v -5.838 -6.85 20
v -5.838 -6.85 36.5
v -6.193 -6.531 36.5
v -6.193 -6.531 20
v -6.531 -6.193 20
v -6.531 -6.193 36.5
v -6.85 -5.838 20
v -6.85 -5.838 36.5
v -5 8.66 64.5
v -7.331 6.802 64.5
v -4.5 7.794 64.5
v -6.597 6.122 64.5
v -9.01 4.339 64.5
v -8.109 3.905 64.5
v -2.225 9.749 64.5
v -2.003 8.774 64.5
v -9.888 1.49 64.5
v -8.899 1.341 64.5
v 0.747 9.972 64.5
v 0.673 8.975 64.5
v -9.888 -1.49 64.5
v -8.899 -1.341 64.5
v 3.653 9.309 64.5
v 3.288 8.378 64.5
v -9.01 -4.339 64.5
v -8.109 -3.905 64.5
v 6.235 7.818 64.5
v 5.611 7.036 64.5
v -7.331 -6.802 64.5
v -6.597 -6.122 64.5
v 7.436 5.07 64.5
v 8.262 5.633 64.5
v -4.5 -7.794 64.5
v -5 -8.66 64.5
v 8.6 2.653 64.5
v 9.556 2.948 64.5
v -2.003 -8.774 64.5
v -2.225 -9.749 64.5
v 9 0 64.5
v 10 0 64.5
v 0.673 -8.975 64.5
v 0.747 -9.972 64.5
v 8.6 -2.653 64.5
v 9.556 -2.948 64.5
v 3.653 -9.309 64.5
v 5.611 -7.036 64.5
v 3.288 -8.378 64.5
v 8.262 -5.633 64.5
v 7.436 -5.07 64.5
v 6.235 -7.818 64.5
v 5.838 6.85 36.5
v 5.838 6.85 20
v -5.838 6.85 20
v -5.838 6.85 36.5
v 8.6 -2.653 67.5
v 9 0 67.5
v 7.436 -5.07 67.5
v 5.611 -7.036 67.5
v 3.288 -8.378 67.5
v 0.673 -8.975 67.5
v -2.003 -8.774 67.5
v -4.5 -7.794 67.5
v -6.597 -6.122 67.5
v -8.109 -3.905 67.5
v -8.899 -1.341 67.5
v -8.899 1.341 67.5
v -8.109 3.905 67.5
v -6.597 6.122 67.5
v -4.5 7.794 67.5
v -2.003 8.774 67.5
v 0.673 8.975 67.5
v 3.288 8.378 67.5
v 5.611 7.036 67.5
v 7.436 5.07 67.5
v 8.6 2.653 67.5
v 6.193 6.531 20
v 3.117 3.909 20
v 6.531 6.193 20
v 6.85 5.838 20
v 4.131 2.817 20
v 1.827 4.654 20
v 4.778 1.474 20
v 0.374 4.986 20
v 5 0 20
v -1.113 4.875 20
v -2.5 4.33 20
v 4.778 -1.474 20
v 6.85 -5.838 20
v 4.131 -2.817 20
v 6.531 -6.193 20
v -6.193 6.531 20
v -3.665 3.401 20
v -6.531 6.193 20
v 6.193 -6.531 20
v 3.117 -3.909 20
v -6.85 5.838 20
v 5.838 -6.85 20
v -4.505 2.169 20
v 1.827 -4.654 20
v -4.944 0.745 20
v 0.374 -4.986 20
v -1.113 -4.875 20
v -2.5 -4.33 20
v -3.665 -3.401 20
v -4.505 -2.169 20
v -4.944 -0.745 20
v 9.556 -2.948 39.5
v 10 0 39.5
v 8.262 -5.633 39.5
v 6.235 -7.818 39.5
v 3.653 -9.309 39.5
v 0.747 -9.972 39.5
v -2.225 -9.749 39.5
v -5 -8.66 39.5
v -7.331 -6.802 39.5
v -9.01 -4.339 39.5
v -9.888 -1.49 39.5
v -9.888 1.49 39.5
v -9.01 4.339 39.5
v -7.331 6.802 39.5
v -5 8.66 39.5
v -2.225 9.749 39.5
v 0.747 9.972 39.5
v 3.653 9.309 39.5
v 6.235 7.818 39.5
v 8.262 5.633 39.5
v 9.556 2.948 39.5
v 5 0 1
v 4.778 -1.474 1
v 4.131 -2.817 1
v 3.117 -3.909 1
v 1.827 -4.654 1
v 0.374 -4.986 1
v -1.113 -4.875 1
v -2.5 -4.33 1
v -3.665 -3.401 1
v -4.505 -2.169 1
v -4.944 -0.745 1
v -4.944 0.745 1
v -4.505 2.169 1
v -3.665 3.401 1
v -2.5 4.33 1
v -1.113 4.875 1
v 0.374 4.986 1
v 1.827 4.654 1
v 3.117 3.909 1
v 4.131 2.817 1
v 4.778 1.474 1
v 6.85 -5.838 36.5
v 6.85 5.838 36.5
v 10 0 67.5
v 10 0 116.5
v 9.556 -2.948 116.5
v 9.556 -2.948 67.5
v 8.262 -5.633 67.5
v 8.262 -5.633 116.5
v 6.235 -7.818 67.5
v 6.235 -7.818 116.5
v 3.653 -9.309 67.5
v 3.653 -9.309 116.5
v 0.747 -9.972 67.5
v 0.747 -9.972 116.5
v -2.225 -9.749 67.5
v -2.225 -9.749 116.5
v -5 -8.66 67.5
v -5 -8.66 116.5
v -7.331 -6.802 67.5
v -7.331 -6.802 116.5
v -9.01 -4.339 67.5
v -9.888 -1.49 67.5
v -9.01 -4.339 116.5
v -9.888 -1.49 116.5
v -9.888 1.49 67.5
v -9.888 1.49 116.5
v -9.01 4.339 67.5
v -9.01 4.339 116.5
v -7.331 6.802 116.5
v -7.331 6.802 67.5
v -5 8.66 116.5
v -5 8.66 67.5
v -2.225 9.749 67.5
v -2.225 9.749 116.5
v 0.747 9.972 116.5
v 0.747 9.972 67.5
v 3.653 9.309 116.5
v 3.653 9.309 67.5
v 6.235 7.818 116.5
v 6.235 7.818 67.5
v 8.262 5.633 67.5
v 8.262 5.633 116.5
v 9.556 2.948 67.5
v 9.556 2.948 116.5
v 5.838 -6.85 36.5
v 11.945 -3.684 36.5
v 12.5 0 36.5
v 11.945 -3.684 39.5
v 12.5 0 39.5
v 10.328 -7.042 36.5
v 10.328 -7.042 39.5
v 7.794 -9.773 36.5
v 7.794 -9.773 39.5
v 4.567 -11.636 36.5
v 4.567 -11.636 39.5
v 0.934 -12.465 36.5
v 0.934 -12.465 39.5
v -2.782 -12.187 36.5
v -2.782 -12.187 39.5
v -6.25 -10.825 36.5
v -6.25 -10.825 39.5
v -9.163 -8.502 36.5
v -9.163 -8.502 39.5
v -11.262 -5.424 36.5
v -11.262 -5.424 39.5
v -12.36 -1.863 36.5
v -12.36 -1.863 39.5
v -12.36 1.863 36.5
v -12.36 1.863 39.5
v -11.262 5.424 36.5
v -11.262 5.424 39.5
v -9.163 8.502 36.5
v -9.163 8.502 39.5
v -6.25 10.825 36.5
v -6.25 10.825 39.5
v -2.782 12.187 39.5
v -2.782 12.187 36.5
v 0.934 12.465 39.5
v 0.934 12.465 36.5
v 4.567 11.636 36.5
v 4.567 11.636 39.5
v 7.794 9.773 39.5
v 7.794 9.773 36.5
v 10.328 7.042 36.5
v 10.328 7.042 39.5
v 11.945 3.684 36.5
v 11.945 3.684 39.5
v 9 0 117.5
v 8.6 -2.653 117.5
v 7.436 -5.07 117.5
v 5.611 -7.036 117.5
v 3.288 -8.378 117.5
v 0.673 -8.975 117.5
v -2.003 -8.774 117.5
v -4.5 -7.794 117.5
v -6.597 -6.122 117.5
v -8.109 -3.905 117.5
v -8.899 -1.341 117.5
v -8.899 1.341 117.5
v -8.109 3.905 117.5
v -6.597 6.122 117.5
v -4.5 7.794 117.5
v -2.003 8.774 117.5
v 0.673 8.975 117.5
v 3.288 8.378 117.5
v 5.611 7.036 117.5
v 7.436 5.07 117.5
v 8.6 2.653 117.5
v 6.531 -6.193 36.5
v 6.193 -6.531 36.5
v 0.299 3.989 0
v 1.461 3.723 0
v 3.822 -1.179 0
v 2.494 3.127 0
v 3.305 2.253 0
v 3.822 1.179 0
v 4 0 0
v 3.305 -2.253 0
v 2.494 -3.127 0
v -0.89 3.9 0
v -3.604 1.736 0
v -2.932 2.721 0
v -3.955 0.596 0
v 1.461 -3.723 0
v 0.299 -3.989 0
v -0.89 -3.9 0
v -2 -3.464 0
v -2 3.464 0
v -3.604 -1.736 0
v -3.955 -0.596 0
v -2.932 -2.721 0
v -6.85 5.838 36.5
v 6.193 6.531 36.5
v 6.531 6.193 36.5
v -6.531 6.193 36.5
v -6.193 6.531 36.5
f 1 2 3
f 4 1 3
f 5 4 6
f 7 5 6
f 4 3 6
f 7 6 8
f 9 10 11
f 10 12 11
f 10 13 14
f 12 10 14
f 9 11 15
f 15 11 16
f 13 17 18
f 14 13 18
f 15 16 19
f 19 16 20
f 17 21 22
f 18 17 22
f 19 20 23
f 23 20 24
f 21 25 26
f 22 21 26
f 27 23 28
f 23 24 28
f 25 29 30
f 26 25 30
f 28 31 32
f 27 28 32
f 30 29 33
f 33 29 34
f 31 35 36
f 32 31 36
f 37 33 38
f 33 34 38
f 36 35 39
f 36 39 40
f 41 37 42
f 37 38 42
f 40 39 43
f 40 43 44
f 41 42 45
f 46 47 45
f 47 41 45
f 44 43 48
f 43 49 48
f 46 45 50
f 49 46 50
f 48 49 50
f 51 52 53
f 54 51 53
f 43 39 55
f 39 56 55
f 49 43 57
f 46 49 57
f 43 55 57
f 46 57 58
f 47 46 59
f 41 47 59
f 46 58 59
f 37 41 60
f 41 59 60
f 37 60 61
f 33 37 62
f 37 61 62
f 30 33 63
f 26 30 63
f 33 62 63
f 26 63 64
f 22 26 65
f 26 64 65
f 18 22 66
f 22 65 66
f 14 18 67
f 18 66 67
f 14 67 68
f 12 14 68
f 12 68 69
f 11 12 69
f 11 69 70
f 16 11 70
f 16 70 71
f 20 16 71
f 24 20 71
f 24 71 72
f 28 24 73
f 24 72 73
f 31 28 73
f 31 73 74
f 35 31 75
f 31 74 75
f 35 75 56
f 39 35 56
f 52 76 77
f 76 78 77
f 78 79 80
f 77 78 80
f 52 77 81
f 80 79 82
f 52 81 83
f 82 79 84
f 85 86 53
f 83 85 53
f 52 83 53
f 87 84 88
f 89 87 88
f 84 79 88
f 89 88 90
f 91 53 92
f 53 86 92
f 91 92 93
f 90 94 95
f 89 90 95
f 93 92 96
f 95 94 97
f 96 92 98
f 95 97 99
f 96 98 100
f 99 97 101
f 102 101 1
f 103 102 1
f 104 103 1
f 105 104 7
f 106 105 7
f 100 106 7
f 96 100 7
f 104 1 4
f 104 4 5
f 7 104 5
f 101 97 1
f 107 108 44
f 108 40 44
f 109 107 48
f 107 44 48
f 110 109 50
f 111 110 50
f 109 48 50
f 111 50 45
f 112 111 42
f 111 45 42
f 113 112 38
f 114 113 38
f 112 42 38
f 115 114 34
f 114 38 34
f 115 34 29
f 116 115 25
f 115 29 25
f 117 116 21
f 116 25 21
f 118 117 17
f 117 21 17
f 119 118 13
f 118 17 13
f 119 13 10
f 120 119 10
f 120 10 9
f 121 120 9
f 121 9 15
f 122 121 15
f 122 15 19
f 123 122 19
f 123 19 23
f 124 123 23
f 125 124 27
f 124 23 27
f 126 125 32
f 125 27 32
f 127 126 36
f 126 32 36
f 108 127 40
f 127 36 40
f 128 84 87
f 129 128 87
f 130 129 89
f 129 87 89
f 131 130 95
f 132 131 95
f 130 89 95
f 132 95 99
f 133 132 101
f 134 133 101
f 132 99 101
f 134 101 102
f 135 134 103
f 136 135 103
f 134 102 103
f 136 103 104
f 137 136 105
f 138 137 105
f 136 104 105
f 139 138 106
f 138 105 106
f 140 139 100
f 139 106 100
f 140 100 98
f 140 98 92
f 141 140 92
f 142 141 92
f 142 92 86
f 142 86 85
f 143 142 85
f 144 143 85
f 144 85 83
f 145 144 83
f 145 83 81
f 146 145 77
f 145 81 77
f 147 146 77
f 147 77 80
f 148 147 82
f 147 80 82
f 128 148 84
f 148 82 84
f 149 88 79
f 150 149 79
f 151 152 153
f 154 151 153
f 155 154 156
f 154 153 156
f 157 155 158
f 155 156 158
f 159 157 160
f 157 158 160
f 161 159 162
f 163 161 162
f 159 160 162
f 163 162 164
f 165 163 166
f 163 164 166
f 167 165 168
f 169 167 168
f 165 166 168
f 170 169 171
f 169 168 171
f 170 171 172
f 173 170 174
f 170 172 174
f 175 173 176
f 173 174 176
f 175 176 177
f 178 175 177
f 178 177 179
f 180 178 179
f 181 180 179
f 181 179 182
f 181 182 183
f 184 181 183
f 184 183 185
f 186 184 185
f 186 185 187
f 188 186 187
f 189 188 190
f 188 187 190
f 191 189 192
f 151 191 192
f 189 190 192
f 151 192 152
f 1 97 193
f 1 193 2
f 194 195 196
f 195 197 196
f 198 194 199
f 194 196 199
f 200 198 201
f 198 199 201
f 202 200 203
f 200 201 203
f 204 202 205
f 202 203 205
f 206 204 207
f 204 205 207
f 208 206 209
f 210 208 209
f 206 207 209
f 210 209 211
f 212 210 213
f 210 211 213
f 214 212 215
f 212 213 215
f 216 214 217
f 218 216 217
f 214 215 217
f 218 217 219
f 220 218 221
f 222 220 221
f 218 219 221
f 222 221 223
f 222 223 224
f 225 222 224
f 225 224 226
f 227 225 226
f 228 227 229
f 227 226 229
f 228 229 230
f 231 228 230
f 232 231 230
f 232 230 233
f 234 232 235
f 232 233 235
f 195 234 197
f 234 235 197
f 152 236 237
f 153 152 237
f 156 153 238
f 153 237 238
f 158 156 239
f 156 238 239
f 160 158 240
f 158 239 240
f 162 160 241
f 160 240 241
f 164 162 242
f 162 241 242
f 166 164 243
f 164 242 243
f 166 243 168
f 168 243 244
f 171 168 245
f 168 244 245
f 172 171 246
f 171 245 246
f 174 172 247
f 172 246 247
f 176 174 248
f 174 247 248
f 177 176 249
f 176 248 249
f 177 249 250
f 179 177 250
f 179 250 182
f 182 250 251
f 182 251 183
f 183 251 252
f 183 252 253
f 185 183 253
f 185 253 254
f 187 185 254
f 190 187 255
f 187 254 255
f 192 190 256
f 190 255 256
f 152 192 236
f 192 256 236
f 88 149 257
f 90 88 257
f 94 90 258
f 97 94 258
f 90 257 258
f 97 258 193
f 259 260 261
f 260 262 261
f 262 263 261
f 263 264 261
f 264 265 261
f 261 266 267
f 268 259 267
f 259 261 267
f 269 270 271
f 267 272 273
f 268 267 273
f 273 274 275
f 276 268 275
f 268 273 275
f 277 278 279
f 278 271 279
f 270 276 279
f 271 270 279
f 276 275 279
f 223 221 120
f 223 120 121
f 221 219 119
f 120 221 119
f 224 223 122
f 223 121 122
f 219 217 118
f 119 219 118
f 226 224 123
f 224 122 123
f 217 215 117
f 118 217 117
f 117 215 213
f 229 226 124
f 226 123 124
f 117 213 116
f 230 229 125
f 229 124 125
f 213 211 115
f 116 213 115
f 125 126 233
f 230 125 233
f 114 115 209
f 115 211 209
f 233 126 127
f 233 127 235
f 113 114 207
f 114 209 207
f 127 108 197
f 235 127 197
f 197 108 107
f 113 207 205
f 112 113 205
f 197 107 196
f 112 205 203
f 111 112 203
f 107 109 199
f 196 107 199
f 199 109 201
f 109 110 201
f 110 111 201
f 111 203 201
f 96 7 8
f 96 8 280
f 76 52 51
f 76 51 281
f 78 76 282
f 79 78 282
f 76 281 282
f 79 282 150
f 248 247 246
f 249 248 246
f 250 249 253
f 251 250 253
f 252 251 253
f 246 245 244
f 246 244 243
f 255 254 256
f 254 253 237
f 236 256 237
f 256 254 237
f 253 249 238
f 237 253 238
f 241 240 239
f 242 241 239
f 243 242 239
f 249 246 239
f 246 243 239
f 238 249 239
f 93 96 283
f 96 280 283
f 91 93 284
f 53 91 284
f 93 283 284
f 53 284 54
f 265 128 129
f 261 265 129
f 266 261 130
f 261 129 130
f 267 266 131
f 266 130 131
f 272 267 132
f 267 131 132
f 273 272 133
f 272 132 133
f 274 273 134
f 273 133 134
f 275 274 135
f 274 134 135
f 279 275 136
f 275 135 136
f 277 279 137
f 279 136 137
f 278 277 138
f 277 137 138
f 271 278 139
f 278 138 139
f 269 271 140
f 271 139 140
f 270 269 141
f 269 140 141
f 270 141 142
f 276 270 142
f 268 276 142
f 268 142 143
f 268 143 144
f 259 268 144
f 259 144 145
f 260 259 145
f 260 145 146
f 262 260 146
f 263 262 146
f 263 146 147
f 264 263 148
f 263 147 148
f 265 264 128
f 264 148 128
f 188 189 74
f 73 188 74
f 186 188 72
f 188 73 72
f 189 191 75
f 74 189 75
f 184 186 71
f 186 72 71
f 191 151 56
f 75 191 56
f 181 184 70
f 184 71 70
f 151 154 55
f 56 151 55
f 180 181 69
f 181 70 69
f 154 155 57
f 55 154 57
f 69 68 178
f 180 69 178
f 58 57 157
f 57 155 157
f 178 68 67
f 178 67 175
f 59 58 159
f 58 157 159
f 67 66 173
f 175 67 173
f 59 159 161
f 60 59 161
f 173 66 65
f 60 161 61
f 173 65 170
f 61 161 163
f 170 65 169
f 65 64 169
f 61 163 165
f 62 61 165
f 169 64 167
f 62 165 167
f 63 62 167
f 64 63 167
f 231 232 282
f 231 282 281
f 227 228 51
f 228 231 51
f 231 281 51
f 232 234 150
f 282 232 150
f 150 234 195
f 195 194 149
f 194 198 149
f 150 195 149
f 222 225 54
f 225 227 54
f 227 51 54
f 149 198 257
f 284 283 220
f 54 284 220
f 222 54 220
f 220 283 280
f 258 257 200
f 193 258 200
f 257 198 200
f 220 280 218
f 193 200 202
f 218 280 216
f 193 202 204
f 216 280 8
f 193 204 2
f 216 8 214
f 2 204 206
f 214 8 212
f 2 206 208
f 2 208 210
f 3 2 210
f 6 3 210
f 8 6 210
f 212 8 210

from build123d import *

# Parameters (mm, degrees)
SKETCH_2_OUTSIDE_W   = 51.54
SKETCH_2_OUTSIDE_H   = 51.54
SKETCH_2_OUTSIDE_W_2 = 13.7
SKETCH_2_OUTSIDE_H_2 = 13.7
CUT_EXTRUDE_1_DEPTH  = 16.5
CHAMFER_1_SIZE       = 1


with BuildPart() as part:
    # 草图1 → 旋转1 (revolve)
    with BuildSketch(Plane(origin=(0, 0, 0), x_dir=(0, 0, -1), z_dir=(1, 0, 0)), mode=Mode.PRIVATE) as revolve_1_sk:
        Polygon((-117.5, 0), (0, 0), (0, 5), (-20, 5), (-20, 9), (-36.5, 9), (-36.5, 12.5), (-39.5, 12.5), (-39.5, 10), (-64.5, 10), (-64.5, 9), (-67.5, 9), (-67.5, 10), (-117.5, 10), align=None)
    revolve(revolve_1_sk.sketch.rotate(Axis((0, 0, 117.5), (0, 0, -1)), 90), axis=Axis((0, 0, 117.5), (0, 0, -1)))

    # 草图2 outside → 切除-拉伸1 (cut)
    with BuildSketch(Plane(origin=(0, 0, 20), x_dir=(-1, 0, 0), z_dir=(0, 0, -1))):
        Rectangle(SKETCH_2_OUTSIDE_W, SKETCH_2_OUTSIDE_H)
        Rectangle(SKETCH_2_OUTSIDE_W_2, SKETCH_2_OUTSIDE_H_2, mode=Mode.SUBTRACT)
    extrude(amount=-CUT_EXTRUDE_1_DEPTH, mode=Mode.SUBTRACT)

    # 倒角1
    chamfer_1_edges = [part.edges().sort_by_distance(p)[0] for p in [
        (-5, 0, 0),
        (-10, 0, 117.5),
    ]]
    chamfer(chamfer_1_edges, length=CHAMFER_1_SIZE)


solid = part.part
